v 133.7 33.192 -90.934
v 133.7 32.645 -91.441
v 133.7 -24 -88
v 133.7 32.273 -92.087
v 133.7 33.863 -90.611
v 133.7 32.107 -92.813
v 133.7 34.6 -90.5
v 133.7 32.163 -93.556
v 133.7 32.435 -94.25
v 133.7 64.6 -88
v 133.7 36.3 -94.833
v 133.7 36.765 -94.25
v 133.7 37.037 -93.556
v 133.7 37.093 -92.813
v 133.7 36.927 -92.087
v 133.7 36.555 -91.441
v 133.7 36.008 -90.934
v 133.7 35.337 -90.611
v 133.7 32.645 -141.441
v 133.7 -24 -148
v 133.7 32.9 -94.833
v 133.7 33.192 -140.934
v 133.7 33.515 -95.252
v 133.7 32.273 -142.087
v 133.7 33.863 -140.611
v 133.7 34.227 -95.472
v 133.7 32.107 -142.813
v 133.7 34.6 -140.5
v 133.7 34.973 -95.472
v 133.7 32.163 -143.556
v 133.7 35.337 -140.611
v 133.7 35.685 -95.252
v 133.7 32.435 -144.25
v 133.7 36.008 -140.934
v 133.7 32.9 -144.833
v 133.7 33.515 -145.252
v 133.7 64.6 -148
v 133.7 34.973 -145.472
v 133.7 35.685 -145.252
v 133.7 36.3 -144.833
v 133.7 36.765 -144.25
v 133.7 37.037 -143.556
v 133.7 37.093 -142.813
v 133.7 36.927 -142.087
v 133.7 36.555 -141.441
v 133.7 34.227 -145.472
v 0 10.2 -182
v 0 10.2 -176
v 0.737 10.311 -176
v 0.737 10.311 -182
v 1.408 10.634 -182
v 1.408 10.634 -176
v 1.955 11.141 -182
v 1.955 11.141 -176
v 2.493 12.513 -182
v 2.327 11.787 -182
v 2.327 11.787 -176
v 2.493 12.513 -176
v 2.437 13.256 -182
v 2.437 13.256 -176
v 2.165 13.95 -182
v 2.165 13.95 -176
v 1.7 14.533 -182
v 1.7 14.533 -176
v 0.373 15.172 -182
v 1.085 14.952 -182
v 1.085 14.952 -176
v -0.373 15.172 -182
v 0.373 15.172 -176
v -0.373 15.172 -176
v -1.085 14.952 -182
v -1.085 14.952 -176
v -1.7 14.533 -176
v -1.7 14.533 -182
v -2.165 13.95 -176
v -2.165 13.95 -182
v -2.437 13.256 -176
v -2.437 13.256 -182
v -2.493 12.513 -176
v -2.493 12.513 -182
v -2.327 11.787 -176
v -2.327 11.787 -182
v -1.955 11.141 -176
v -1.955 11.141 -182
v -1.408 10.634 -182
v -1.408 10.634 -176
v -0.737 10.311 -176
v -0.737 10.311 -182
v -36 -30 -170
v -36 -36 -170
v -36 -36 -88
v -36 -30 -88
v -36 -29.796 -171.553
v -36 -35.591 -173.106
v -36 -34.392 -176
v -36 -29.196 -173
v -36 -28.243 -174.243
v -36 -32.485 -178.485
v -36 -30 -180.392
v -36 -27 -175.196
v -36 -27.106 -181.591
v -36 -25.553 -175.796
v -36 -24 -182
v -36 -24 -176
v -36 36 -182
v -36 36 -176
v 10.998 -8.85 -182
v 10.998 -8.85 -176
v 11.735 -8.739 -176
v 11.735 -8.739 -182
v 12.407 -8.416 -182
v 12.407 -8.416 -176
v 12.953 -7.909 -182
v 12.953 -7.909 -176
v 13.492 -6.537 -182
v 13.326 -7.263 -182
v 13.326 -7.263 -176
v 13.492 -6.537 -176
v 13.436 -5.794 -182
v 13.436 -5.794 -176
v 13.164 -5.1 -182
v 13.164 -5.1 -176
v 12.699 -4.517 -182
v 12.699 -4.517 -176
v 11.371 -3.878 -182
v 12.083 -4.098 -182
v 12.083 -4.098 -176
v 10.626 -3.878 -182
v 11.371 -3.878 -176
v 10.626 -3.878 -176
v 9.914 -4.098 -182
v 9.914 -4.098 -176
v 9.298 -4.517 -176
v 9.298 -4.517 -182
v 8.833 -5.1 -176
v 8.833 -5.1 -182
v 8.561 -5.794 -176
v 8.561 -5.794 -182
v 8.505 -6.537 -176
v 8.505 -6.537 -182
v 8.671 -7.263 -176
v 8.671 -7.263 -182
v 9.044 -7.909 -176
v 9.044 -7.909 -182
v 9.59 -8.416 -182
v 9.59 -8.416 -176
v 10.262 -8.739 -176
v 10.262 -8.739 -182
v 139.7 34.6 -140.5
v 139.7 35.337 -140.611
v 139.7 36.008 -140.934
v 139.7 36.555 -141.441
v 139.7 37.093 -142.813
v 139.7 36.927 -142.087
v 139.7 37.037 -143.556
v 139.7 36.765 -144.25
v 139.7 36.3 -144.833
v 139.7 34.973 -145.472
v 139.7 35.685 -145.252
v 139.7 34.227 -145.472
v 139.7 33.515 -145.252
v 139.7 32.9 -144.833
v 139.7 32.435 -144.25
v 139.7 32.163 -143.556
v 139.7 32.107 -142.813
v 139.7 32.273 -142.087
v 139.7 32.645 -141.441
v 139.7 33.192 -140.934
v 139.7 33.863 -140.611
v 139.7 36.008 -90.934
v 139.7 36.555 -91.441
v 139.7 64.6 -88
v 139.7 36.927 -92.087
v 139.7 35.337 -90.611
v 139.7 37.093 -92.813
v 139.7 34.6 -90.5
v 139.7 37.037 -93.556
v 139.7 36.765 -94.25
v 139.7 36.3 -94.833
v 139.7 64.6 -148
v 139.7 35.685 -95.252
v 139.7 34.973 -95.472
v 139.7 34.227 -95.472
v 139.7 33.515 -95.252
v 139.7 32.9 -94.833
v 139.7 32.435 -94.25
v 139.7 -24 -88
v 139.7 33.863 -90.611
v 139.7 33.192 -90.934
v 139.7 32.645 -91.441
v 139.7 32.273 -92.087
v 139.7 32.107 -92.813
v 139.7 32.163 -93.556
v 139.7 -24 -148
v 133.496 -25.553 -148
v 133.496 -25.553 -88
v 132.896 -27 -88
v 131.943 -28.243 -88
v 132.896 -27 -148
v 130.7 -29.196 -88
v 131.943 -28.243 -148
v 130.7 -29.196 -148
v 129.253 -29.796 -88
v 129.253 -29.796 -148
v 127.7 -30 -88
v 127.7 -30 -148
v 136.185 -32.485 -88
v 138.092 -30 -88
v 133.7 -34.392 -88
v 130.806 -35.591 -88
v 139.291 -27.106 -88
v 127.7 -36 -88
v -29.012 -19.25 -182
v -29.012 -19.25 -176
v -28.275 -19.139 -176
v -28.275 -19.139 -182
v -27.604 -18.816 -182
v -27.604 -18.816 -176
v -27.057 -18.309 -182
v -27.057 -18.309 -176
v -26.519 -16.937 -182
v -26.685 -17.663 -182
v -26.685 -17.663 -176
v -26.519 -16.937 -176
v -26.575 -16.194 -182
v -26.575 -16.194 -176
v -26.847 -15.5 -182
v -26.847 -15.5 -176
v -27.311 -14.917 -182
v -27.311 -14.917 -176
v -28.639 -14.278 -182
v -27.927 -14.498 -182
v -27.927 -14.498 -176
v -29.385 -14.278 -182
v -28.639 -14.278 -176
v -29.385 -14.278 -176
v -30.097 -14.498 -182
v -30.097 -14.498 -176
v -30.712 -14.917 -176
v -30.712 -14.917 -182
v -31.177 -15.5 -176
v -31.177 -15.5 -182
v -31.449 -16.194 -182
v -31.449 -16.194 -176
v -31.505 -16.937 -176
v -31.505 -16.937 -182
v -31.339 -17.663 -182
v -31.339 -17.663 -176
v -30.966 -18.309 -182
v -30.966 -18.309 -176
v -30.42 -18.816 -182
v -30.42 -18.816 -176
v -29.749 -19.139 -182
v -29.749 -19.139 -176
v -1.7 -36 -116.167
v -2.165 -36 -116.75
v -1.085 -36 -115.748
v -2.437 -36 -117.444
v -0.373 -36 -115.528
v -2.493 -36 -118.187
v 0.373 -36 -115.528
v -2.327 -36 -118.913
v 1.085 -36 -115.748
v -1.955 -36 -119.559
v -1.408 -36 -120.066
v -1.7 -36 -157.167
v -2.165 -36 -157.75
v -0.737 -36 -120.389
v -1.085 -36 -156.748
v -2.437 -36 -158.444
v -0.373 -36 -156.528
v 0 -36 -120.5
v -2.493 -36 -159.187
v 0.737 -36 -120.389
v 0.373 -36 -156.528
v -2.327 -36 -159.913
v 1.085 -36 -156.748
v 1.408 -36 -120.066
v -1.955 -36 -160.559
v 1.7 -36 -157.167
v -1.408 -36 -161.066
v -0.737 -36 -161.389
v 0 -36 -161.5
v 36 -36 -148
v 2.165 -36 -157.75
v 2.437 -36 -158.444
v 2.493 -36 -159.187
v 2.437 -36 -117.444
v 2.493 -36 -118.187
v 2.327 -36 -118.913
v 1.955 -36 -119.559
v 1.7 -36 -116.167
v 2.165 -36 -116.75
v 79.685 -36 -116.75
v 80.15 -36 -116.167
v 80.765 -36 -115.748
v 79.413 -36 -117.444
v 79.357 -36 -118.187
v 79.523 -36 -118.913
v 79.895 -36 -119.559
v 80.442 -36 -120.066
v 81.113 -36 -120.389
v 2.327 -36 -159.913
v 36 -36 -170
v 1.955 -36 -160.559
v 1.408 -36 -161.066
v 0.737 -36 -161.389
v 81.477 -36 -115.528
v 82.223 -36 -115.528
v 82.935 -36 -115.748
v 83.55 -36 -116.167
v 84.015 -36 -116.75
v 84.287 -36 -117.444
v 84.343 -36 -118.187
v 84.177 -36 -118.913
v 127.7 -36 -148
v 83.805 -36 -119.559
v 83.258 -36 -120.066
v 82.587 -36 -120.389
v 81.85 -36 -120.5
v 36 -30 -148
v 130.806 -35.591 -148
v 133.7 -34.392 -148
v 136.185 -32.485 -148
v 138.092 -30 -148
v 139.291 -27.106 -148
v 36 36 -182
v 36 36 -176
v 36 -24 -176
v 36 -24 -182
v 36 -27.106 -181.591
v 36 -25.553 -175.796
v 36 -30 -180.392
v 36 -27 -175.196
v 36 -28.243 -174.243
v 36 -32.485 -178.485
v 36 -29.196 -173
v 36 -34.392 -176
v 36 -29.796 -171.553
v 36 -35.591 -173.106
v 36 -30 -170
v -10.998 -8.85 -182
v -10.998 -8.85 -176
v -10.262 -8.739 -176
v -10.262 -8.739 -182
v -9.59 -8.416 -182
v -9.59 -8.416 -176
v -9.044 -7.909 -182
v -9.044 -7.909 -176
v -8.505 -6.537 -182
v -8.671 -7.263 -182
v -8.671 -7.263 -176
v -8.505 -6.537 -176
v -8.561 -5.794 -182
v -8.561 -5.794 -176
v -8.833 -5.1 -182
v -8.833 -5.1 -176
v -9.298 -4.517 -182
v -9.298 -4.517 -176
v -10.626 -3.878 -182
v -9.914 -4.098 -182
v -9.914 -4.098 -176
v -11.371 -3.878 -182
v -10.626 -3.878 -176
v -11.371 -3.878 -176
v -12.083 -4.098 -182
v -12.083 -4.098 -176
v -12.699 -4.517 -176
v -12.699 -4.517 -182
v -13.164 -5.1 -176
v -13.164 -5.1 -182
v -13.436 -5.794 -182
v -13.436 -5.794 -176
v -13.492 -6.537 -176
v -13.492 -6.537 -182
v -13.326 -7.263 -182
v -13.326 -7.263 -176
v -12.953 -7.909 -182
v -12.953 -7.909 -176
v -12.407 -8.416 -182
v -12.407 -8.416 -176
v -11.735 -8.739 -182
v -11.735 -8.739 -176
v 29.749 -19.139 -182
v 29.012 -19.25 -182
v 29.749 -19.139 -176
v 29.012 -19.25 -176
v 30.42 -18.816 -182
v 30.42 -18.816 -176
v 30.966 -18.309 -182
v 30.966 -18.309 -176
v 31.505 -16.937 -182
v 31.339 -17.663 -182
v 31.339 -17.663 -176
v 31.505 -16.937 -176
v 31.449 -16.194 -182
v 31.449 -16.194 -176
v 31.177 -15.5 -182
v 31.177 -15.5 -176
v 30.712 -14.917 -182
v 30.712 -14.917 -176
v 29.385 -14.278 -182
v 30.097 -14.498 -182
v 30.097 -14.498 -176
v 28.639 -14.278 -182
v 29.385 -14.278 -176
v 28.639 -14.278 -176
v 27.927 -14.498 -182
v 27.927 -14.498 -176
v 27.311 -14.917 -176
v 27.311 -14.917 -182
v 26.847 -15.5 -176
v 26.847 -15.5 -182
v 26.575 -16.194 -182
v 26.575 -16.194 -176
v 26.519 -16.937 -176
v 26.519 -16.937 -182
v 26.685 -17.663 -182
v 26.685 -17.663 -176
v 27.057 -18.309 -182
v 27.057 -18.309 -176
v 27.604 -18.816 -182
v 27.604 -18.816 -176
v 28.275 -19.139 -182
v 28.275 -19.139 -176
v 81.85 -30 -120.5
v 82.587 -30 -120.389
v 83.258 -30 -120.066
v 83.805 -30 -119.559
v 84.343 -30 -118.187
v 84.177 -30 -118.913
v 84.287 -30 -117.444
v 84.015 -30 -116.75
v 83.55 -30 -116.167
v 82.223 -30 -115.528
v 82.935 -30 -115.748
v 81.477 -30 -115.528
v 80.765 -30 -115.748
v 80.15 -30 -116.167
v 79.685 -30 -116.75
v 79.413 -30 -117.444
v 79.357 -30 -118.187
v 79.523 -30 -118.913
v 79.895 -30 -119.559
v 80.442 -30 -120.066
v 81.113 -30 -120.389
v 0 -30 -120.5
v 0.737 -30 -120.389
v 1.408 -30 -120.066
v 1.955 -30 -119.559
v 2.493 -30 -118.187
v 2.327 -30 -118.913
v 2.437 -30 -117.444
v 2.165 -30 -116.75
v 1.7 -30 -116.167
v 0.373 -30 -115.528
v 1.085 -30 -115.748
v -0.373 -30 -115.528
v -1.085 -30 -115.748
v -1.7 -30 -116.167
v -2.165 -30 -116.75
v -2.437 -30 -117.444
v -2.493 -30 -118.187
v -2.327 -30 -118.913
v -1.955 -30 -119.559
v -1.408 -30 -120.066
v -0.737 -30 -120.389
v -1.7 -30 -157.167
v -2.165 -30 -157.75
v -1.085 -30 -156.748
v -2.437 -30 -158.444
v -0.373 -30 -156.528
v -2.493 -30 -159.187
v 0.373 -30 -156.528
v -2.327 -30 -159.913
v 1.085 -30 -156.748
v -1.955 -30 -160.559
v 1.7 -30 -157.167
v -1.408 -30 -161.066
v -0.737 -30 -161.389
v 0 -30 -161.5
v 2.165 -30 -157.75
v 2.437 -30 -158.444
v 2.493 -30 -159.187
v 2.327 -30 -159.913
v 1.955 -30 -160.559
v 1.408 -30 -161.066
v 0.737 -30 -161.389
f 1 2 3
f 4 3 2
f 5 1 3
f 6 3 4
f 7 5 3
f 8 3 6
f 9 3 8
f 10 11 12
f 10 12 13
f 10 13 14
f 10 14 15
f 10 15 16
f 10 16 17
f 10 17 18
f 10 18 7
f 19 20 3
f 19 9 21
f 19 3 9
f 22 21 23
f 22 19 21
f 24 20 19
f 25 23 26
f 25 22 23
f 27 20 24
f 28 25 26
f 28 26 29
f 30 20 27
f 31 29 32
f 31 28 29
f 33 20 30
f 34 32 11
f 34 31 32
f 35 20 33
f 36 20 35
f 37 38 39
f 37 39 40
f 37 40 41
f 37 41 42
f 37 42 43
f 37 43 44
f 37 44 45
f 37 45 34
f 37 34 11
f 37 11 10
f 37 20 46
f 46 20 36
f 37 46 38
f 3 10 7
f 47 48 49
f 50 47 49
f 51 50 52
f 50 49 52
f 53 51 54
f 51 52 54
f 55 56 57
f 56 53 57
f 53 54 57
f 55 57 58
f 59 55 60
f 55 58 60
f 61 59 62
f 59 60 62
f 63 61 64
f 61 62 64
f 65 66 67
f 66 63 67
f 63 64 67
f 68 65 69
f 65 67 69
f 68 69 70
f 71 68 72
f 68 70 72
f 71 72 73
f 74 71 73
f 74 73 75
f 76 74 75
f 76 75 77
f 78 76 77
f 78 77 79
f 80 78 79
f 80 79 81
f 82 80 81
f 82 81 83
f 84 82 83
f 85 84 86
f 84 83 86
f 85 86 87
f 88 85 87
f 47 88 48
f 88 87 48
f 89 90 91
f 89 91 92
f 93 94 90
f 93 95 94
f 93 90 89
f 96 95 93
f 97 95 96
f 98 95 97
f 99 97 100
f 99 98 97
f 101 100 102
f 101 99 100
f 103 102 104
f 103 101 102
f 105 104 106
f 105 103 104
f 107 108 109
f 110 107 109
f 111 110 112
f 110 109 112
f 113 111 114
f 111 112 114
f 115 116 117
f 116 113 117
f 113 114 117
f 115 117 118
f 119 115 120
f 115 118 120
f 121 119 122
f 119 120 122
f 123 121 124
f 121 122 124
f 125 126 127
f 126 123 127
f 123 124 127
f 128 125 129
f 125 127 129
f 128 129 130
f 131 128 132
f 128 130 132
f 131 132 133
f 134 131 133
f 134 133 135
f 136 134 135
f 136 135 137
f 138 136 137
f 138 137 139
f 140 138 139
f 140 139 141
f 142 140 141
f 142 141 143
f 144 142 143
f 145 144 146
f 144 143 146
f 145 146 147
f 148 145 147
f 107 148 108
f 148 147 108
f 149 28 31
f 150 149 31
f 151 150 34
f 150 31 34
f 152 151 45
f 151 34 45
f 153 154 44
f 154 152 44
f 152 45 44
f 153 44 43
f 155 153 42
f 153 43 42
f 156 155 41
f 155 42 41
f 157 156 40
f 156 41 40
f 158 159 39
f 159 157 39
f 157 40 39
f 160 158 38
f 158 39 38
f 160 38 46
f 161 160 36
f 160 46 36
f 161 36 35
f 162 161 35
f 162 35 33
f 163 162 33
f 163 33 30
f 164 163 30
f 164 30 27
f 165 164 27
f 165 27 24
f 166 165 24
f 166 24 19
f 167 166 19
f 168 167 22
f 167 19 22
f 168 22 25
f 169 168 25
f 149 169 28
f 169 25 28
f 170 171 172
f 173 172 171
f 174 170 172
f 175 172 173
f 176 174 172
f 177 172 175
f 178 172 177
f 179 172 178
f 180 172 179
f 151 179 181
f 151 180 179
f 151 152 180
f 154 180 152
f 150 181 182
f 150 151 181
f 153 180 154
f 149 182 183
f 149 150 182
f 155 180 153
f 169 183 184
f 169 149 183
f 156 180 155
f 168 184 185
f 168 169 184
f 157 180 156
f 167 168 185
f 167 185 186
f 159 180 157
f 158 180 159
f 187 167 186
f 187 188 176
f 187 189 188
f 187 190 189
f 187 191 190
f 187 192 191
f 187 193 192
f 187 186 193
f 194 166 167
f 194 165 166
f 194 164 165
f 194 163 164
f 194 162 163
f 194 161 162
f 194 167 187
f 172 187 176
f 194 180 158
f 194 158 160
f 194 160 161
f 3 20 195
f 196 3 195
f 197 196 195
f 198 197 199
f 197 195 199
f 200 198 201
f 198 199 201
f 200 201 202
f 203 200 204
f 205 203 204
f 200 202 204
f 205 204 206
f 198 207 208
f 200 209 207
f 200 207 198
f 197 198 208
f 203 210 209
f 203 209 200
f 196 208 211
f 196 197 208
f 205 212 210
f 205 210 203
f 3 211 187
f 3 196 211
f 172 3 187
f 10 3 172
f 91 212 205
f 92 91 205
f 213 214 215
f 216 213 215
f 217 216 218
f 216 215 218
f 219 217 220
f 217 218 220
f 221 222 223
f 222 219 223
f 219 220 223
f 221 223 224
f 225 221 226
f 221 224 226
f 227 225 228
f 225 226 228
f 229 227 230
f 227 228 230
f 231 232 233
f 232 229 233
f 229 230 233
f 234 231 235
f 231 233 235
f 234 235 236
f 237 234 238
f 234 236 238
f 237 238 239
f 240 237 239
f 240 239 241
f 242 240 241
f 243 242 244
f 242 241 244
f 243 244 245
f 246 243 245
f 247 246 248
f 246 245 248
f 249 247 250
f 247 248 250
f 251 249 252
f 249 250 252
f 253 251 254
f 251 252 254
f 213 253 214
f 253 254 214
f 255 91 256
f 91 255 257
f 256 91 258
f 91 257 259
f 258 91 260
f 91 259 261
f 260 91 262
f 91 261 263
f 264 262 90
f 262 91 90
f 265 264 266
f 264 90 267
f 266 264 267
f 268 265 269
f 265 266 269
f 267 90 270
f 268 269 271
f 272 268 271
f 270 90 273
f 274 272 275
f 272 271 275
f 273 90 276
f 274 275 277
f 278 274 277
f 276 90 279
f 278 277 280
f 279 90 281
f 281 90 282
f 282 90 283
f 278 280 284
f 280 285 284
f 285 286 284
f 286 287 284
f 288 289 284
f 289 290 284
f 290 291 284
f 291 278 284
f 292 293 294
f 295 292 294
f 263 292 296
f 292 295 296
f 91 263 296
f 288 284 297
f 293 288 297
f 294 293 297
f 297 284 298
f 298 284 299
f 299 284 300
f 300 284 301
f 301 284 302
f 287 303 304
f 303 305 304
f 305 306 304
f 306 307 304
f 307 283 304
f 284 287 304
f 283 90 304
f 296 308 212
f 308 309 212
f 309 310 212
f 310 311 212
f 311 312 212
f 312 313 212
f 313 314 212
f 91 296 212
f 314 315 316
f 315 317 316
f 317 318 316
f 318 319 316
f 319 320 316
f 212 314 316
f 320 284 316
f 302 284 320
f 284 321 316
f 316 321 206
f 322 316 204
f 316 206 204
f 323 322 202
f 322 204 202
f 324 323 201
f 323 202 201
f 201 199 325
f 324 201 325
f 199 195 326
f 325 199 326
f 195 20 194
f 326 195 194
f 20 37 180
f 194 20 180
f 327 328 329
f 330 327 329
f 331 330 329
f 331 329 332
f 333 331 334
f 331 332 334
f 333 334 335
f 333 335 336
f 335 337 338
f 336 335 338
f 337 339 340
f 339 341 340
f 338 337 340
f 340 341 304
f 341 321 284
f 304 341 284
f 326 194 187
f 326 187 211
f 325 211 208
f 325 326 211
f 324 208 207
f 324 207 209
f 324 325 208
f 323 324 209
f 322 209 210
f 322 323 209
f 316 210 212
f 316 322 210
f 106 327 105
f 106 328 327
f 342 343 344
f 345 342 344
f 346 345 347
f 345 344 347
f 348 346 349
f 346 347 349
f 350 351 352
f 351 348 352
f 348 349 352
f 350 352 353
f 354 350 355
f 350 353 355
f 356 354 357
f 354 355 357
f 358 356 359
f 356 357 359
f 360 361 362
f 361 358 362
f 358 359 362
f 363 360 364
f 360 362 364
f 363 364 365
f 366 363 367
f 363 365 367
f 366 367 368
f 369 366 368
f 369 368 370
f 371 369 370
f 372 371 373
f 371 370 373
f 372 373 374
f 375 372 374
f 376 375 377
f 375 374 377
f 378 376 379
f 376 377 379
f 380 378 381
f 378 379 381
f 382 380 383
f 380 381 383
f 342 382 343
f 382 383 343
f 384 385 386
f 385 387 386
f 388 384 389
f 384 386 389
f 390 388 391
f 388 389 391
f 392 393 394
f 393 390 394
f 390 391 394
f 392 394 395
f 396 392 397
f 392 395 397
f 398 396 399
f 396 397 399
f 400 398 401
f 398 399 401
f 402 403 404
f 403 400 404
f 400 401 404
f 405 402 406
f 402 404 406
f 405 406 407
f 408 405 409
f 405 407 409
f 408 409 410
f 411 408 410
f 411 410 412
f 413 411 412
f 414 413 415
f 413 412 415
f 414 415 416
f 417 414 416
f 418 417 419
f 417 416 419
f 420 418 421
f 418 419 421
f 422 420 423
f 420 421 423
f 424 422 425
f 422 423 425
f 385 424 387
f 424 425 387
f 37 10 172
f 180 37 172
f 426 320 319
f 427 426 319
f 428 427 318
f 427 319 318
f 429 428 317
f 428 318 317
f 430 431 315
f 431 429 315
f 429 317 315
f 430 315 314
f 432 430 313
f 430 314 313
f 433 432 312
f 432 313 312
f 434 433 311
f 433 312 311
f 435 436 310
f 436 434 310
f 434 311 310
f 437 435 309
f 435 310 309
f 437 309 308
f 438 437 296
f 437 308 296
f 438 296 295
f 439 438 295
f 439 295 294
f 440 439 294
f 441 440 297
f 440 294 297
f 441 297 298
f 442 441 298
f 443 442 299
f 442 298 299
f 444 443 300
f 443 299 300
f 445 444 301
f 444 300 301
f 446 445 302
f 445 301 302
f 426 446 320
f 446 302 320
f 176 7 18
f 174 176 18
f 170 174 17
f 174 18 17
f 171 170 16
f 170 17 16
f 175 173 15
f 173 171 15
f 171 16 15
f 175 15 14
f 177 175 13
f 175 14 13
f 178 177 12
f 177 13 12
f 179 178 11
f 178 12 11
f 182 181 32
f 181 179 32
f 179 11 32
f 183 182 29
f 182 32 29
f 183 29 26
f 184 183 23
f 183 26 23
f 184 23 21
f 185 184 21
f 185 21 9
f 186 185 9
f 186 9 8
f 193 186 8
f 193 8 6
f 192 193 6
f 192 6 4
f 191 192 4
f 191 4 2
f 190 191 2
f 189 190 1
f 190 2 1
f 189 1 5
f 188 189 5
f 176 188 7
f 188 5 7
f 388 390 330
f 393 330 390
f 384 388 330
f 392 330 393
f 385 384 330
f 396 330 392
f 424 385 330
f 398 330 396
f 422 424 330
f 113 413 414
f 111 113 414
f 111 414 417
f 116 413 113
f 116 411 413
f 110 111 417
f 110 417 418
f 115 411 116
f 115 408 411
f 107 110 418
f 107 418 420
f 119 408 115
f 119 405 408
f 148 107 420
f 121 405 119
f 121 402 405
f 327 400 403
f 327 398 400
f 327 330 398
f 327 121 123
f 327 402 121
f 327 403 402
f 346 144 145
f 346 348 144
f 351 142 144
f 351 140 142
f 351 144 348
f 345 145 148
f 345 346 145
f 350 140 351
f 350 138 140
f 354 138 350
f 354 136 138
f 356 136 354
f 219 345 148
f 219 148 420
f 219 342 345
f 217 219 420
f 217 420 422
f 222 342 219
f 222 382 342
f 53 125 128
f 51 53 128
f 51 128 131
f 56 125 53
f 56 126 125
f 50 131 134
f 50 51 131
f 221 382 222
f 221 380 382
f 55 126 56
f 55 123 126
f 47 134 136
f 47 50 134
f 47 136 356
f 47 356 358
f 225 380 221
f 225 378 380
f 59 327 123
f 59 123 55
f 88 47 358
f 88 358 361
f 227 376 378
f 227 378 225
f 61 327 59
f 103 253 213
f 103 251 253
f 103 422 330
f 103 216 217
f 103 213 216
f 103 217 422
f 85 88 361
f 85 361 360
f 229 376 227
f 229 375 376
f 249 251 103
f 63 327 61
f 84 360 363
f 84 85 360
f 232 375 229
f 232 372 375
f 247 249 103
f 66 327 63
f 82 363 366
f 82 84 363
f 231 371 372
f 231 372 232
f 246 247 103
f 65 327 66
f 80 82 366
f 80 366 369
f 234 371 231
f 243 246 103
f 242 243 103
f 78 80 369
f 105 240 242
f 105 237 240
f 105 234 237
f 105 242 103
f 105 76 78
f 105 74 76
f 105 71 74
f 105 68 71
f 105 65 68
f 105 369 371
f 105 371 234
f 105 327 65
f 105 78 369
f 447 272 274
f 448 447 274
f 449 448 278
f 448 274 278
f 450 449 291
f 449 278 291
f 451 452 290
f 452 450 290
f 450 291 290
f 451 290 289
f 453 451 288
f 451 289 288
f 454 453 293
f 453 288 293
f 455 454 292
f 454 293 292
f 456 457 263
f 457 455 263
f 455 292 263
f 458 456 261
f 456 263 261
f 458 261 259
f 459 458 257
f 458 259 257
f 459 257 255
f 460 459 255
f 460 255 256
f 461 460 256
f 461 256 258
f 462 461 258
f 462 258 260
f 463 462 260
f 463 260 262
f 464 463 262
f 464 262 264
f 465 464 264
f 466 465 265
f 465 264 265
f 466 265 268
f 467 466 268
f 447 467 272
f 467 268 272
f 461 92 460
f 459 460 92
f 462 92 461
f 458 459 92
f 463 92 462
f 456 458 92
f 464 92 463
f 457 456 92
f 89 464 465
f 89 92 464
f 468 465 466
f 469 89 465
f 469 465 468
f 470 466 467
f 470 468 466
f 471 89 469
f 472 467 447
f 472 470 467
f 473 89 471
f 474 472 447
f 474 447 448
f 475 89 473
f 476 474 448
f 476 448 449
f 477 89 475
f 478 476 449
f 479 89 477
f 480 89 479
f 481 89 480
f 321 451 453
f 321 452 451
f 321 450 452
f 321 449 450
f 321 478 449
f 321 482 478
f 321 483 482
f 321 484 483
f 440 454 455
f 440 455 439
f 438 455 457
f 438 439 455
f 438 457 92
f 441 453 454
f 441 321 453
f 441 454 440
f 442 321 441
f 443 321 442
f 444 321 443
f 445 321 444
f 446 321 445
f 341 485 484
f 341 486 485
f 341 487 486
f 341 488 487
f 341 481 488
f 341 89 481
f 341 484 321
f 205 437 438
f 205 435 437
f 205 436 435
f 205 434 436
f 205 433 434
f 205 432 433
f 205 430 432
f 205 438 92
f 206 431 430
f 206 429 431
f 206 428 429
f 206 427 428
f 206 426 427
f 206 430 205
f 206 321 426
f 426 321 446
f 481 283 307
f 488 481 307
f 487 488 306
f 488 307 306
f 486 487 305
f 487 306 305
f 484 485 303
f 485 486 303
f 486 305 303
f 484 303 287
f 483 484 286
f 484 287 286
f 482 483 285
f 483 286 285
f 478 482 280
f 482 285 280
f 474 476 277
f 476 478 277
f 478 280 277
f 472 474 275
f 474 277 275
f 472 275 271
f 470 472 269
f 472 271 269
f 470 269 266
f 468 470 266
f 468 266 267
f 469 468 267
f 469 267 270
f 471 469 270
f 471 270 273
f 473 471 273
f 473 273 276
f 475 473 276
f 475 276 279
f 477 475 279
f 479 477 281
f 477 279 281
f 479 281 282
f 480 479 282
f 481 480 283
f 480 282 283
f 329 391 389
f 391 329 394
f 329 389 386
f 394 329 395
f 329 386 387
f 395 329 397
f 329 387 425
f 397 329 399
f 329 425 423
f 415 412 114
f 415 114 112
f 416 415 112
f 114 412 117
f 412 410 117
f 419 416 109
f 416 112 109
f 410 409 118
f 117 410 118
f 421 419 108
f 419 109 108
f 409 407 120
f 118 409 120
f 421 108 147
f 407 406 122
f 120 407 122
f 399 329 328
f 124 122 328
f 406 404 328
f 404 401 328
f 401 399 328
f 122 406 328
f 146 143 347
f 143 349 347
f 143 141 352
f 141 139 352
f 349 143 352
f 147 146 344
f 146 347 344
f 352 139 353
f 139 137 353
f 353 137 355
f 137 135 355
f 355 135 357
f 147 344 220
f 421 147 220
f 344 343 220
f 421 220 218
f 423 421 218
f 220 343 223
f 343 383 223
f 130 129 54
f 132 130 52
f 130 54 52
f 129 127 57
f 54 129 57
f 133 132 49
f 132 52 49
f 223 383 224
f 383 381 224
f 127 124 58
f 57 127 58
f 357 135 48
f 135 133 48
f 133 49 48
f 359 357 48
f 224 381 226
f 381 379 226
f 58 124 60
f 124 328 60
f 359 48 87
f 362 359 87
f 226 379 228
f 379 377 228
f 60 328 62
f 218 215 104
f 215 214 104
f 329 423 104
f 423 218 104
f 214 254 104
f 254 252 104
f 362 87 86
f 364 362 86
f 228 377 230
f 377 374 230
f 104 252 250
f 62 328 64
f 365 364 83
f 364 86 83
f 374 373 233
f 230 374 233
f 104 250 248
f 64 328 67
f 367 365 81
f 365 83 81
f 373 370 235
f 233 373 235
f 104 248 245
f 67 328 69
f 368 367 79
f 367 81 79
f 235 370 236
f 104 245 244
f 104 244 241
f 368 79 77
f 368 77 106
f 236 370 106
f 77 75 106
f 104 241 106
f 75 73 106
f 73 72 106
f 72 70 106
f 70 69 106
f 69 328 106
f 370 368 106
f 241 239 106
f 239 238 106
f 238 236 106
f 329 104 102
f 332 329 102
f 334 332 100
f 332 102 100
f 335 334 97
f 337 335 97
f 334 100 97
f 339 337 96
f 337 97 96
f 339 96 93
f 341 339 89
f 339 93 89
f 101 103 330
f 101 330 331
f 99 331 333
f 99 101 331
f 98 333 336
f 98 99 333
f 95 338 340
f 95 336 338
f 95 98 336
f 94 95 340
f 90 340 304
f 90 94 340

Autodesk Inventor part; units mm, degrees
ref_plane "YZ Plane" through (0, 0, 0) normal (1, 0, 0) x (0, 1, 0)
ref_plane "XZ Plane" through (0, 0, 0) normal (0, 1, 0) x (-1, 0, 0)
sketch "Sketch1" plane through (0, 0, 0) normal (0, 0, 1) x (1, 0, 0)
  line L0 (-36, 36) -> (36, 36)
  line L1 (36, 36) -> (36, -36)
  line L2 (36, -36) -> (-36, -36)
  line L3 (-36, -36) -> (-36, 36)
  point P0 (0, 0)
  dimension "d0" = 72
  dimension "d1" = 36
  dimension "d2" = 72
  dimension "d3" = 36
extrude "Plate1" add sketch "Sketch1" along normal blind 6
sketch "Sketch2" plane through (-36, -30, 6) normal (0, -1, 0) x (1, 0, 0)
  line L0 (72, 0) -> (0, 0)
  line L1 (0, 0) -> (0, -94)
  line L2 (0, -94) -> (72, -94)
  line L3 (72, -94) -> (72, 0)
edge flange "Flange1" height 94 angle 90 thickness 6 bend radius 6 thickness toward (0, -1, 0) relief tear relief width 6 relief depth 3 edges at (0, -36, 0) wall of the first edge with corners at (36, -30, 6) (-36, -30, 6) (-36, -30, -88) (36, -30, -88)
bend "Bend1"
corner "Corner1"
sketch "Sketch3" plane through (-36, -30, -88) normal (0, 1, 0) x (1, 0, 0)
  line L0 (72, -82) -> (72, 0)
  line L1 (72, 0) -> (175.7, 0)
  line L2 (175.7, 0) -> (175.7, -60)
  line L3 (175.7, -60) -> (72, -60)
  line L4 (72, -60) -> (72, 0)
  point P0 (36, -88)
  dimension "d15" = 103.7
  dimension "d16" = 60
sheet face with bend "Face2" sketch "Sketch3" thickness 6 toward (0, -1, 0) bend radius 6
bend "Bend2"
sketch "Sketch4" plane through (133.7, -36, -88) normal (1, 0, 0) x (0, 1, 0)
  line L0 (0, 60) -> (0, 0)
  line L1 (0, 0) -> (100.6, 0)
  line L2 (100.6, 0) -> (100.6, 60)
  line L3 (100.6, 60) -> (0, 60)
edge flange "Flange2" height 100.6 angle 90 thickness 6 bend radius 6 thickness toward (1, 0, 0) relief tear relief width 6 relief depth 3 edges at (139.7, -30, -58) wall of the first edge with corners at (133.7, -36, -28) (133.7, -36, -88) (133.7, 64.6, -88) (133.7, 64.6, -28)
bend "Bend3"
corner "Corner2"
sketch "Sketch5" plane through (139.7, 64.6, -28) normal (1, 0, 0) x (0, 0, -1)
  circle A0 centre (30, -30) radius 25
  line L0 (60, 0) -> (60, -88.6) projected
  line L1 (0, -88.6) -> (0, 0) projected
  line L2 (0, 0) -> (60, 0) projected
  point P0 (-28, -64.6)
  point P1 (55, -30)
  point P2 (5, -30)
  dimension "d32" = 60
  dimension "d33" = 30
  dimension "d34" = 30
  dimension "d35" = 50
  dimension "d36" = 30
  dimension "d37" = 30
hole "Hole1" at (139.7, 34.6, -33) at (139.7, 34.6, -83) direction (-1, 0, 0) diameter 5 end through all
sketch "Sketch6" plane through (0, 0, 6) normal (0, 0, 1) x (1, 0, 0)
  circle A0 centre (0, 0) radius 12.7
  line L0 (36, -36) -> (-36, -36) projected
  circle A1 centre (0, 0) radius 33.5
  line L1 (0, 0) -> (29.0119, -16.75)
  line L2 (0, 0) -> (-29.0119, -16.75)
  line L3 (0, 0) -> (0, 33.5)
  point P0 (0, 0)
  point P1 (0, 12.7)
  point P2 (10.9985, -6.35)
  point P3 (-10.9985, -6.35)
  dimension "d45" = 36
  dimension "d46" = 25.4
  dimension "d47" = 67
  dimension "d48" = 120
  dimension "d49" = 120
  dimension "d50" = 0
hole "Hole2" at (0, 12.7, 6) at (-10.9985, -6.35, 6) at (10.9985, -6.35, 6) at (29.0119, -16.75, 6) at (-29.0119, -16.75, 6) direction (0, 0, -1) diameter 5 end through all
sketch "Sketch7" plane through (-36, -30, -6) normal (0, 1, 0) x (1, 0, 0)
  line L0 (163.7, 82) -> (0, 82) projected
  line L1 (163.7, 22) -> (72, 22) projected
  line L2 (0, 0) -> (0, 82) projected
  line L3 (72, 0) -> (72, 22) projected
  point P0 (36, -6)
  point P1 (117.85, 52)
  point P2 (36, 52)
  point P3 (36, 11)
  dimension "d65" = 60
  dimension "d66" = 72
  dimension "d67" = 30
  dimension "d68" = 30
  dimension "d69" = 36
  dimension "d70" = 22
  dimension "d71" = 11
  dimension "d72" = 36
  dimension "d73" = 91.7
  dimension "d74" = 45.85
hole "Hole3" at (81.85, -30, -58) at (0, -30, -58) at (0, -30, -17) direction (0, -1, 0) diameter 5 end through all
mirror "Mirror1" about plane through (133.7, -24, -88) normal (0, 0, -1)
ref_plane "Work Plane1" through (127.7, -30, -88) normal (0, 0, -1) x (-1, 0, 0)
split "Split1" plane through (127.7, -30, -88) removes the side toward (0, 0, 1)
equation "\"d67\" = 0.5 * d65"
equation "\"d68\" = 0.5 * d65"
equation "\"d69\" = 0.5 * d66"
equation "\"d71\" = 0.5 * d70"
equation "\"d72\" = 0.5 * d66"
equation "\"d74\" = 0.5 * d73"
equation "\"d1\" = 0.5 * d0"
equation "\"d2\" = d0"
equation "\"d33\" = 0.5 * d32"
equation "\"d34\" = d33"
equation "\"d36\" = d34"
equation "\"d37\" = d36"
equation "\"d43\" = Thickness"
equation "\"d49\" = d48"
equation "\"d56\" = Thickness"
equation "\"d63\" = Thickness"
equation "\"d4\" = Thickness"
equation "\"d5\" = BendReliefWidth"
equation "\"d6\" = BendReliefDepth"
equation "\"d7\" = MinimumRemnant"
equation "\"d8\" = TransitionRadius"
equation "\"d11\" = BendRadius"
equation "\"d12\" = CornerReliefSize"
equation "\"d13\" = GapSize"
equation "\"d14\" = JacobiRadiusSize"
equation "\"d17\" = BendRadius"
equation "\"d18\" = BendReliefWidth"
equation "\"d20\" = MinimumRemnant"
equation "\"d19\" = BendReliefDepth"
equation "\"d21\" = TransitionRadius"
equation "\"d22\" = BendReliefWidth"
equation "\"d23\" = BendReliefDepth"
equation "\"d24\" = MinimumRemnant"
equation "\"d25\" = TransitionRadius"
equation "\"d28\" = BendRadius"
equation "\"d29\" = CornerReliefSize"
equation "\"d30\" = GapSize"
equation "\"d31\" = JacobiRadiusSize"
equation "\"d3\" = d1"
equation "\"BendRadius\" = Thickness"
equation "\"BendReliefWidth\" = Thickness"
equation "\"BendReliefDepth\" = 0.5 * Thickness"
equation "\"CornerReliefSize\" = 4 * Thickness"
equation "\"MinimumRemnant\" = 2 * Thickness"
equation "\"TransitionRadius\" = BendRadius"
equation "\"JacobiRadiusSize\" = BendRadius"
equation "\"GapSize\" = Thickness"
equation "\"Thickness\" = 6"
properties part number "motorHolder_flipped"
